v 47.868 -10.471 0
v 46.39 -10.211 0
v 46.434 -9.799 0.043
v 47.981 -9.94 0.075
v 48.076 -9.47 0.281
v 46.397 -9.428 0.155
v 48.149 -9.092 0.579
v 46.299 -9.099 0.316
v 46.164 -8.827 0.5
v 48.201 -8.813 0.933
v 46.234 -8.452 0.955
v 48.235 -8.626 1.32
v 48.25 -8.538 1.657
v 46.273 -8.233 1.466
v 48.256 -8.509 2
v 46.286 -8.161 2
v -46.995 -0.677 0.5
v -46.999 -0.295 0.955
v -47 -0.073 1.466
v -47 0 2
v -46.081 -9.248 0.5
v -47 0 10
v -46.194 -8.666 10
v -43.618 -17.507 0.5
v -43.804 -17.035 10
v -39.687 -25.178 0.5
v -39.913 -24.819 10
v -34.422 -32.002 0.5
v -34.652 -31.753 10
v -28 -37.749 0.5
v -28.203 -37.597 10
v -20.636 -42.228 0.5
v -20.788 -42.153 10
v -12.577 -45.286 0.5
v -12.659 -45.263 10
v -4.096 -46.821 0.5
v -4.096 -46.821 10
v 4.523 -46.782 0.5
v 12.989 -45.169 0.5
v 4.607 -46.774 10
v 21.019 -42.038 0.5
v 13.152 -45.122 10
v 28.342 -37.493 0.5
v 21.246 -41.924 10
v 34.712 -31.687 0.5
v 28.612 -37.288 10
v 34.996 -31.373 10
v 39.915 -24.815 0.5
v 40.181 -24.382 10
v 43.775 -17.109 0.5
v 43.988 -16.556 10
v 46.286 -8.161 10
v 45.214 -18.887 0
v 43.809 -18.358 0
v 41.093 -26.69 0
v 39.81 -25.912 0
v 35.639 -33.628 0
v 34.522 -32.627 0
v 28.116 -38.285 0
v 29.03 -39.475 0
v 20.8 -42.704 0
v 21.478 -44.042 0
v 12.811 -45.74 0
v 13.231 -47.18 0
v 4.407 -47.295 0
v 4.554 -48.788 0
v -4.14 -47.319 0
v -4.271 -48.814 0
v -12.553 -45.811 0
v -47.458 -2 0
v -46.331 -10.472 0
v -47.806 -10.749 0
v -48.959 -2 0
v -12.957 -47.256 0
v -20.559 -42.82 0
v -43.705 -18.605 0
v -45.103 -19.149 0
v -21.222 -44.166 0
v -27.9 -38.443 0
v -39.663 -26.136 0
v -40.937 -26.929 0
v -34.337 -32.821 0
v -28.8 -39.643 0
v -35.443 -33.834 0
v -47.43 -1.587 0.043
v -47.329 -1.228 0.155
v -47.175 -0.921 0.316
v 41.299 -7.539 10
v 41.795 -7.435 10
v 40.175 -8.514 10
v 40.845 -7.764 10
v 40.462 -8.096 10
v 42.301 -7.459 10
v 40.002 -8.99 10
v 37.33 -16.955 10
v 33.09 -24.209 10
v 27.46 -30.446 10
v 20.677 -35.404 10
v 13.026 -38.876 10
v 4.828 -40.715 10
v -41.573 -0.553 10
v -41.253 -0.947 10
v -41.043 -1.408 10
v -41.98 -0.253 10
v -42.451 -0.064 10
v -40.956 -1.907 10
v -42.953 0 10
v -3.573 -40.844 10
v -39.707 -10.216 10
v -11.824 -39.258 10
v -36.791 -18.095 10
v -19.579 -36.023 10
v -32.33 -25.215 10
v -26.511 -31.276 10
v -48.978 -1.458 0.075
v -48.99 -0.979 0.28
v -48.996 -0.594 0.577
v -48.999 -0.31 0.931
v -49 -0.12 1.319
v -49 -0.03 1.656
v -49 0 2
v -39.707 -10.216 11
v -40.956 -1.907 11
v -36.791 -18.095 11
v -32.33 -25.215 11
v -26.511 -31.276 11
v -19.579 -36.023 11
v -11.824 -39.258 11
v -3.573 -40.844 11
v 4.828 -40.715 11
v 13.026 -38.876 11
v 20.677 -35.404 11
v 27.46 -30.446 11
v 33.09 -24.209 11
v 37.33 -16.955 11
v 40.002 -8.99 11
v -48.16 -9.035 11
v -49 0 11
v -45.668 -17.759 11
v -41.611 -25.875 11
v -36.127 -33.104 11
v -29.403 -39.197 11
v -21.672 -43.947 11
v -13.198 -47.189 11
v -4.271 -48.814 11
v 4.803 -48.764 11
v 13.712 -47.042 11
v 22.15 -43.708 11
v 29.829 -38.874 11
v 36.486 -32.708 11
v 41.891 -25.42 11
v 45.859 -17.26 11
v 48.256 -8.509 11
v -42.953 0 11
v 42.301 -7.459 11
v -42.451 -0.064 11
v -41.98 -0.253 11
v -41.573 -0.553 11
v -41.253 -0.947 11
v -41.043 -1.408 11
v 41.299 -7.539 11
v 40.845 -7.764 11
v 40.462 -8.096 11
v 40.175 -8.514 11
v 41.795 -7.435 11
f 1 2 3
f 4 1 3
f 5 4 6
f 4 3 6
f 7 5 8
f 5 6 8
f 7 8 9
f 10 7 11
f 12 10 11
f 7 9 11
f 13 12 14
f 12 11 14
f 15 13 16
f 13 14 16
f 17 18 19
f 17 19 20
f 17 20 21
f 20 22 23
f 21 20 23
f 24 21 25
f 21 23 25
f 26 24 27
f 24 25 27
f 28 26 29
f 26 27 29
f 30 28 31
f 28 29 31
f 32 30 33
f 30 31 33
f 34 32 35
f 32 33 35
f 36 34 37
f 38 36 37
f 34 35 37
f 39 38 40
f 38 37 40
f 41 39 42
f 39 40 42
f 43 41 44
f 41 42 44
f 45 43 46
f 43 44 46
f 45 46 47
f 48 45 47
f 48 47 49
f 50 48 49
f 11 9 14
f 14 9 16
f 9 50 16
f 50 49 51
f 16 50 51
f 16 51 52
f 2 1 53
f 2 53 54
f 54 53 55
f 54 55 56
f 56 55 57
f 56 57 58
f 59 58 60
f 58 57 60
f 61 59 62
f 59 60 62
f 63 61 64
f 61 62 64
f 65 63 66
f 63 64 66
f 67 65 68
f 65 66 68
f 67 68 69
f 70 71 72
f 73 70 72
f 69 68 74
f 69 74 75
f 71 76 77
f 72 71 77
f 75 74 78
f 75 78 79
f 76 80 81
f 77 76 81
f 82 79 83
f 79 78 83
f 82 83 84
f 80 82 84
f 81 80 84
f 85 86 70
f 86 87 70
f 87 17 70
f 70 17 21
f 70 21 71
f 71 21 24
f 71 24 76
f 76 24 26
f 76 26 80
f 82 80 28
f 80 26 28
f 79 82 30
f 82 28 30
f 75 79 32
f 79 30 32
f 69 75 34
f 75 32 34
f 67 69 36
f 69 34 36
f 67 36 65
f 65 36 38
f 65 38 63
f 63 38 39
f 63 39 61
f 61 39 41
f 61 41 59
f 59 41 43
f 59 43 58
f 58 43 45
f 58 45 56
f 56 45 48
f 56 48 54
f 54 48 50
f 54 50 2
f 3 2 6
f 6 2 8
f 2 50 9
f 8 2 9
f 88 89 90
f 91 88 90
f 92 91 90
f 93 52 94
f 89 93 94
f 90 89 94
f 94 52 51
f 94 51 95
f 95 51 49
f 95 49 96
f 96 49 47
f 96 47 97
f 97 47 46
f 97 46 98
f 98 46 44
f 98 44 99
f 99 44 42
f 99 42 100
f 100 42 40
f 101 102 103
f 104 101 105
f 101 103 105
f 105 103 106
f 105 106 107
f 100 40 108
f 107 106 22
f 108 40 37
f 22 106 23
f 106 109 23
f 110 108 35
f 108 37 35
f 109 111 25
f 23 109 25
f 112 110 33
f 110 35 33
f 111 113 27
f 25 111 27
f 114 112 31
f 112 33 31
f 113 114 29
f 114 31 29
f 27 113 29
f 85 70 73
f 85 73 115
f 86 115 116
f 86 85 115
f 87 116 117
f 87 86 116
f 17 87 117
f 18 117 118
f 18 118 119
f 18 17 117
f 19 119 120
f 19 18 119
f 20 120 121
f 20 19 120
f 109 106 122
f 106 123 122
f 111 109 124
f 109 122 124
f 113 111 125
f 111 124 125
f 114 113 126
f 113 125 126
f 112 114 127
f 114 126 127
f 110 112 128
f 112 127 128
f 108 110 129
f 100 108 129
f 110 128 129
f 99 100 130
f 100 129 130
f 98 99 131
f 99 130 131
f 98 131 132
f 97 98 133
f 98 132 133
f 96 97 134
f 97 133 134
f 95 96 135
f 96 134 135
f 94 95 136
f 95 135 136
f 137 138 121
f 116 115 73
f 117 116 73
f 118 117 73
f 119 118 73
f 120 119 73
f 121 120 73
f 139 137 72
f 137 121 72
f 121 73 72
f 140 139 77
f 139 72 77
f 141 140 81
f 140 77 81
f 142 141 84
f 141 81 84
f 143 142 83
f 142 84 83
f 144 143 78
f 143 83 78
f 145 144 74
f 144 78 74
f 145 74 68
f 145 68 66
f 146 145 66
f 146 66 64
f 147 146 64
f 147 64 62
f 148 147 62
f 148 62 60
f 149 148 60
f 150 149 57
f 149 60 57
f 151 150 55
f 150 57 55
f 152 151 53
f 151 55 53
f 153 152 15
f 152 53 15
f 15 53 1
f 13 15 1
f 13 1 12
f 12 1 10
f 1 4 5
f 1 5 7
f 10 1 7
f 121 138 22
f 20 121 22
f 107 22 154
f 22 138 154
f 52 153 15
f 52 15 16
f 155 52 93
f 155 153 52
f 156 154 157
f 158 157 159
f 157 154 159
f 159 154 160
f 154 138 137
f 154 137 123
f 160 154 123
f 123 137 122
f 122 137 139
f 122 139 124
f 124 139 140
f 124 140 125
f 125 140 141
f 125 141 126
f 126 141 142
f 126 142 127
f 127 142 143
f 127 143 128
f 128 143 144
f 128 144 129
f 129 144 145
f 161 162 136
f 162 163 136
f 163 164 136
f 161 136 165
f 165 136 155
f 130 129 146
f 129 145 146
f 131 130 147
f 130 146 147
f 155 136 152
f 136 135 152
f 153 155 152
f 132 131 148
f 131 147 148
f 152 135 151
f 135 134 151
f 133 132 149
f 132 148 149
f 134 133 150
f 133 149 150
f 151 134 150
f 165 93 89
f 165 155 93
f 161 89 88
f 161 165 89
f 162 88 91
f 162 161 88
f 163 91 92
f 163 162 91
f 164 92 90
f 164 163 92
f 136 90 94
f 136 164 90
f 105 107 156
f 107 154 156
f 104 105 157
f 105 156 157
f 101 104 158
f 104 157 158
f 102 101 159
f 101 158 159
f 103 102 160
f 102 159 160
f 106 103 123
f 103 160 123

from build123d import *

# Parameters (mm, degrees)
F1_ANGLE = 170
F2_SIZE  = 0.5
F3_R     = 2


with BuildPart() as f1:
    # F0 (on Front) → F1 (revolve)
    with BuildSketch(Plane.XZ):
        Polygon((-49, 11), (-49, 0), (-47, 0), (-47, 10), (-41, 10), (-41, 11), align=None)
    revolve(axis=Axis((0, 0, 4.248688), (0, 0, 1)), revolution_arc=F1_ANGLE)

    # F2
    f2_edges = [f1.edges().sort_by_distance(p)[0] for p in [
        (-4.09632, -46.821151, 0),
    ]]
    chamfer(f2_edges, length=F2_SIZE)

    # F3
    f3_edges = [f1.edges().sort_by_distance(p)[0] for p in [
        (47.516974, -8.378525, 0),
        (-48.25, 0, 0),
        (-41, 0, 10.5),
        (40.377118, -7.119575, 10.5),
    ]]
    fillet(f3_edges, radius=F3_R)


solid = f1.part
